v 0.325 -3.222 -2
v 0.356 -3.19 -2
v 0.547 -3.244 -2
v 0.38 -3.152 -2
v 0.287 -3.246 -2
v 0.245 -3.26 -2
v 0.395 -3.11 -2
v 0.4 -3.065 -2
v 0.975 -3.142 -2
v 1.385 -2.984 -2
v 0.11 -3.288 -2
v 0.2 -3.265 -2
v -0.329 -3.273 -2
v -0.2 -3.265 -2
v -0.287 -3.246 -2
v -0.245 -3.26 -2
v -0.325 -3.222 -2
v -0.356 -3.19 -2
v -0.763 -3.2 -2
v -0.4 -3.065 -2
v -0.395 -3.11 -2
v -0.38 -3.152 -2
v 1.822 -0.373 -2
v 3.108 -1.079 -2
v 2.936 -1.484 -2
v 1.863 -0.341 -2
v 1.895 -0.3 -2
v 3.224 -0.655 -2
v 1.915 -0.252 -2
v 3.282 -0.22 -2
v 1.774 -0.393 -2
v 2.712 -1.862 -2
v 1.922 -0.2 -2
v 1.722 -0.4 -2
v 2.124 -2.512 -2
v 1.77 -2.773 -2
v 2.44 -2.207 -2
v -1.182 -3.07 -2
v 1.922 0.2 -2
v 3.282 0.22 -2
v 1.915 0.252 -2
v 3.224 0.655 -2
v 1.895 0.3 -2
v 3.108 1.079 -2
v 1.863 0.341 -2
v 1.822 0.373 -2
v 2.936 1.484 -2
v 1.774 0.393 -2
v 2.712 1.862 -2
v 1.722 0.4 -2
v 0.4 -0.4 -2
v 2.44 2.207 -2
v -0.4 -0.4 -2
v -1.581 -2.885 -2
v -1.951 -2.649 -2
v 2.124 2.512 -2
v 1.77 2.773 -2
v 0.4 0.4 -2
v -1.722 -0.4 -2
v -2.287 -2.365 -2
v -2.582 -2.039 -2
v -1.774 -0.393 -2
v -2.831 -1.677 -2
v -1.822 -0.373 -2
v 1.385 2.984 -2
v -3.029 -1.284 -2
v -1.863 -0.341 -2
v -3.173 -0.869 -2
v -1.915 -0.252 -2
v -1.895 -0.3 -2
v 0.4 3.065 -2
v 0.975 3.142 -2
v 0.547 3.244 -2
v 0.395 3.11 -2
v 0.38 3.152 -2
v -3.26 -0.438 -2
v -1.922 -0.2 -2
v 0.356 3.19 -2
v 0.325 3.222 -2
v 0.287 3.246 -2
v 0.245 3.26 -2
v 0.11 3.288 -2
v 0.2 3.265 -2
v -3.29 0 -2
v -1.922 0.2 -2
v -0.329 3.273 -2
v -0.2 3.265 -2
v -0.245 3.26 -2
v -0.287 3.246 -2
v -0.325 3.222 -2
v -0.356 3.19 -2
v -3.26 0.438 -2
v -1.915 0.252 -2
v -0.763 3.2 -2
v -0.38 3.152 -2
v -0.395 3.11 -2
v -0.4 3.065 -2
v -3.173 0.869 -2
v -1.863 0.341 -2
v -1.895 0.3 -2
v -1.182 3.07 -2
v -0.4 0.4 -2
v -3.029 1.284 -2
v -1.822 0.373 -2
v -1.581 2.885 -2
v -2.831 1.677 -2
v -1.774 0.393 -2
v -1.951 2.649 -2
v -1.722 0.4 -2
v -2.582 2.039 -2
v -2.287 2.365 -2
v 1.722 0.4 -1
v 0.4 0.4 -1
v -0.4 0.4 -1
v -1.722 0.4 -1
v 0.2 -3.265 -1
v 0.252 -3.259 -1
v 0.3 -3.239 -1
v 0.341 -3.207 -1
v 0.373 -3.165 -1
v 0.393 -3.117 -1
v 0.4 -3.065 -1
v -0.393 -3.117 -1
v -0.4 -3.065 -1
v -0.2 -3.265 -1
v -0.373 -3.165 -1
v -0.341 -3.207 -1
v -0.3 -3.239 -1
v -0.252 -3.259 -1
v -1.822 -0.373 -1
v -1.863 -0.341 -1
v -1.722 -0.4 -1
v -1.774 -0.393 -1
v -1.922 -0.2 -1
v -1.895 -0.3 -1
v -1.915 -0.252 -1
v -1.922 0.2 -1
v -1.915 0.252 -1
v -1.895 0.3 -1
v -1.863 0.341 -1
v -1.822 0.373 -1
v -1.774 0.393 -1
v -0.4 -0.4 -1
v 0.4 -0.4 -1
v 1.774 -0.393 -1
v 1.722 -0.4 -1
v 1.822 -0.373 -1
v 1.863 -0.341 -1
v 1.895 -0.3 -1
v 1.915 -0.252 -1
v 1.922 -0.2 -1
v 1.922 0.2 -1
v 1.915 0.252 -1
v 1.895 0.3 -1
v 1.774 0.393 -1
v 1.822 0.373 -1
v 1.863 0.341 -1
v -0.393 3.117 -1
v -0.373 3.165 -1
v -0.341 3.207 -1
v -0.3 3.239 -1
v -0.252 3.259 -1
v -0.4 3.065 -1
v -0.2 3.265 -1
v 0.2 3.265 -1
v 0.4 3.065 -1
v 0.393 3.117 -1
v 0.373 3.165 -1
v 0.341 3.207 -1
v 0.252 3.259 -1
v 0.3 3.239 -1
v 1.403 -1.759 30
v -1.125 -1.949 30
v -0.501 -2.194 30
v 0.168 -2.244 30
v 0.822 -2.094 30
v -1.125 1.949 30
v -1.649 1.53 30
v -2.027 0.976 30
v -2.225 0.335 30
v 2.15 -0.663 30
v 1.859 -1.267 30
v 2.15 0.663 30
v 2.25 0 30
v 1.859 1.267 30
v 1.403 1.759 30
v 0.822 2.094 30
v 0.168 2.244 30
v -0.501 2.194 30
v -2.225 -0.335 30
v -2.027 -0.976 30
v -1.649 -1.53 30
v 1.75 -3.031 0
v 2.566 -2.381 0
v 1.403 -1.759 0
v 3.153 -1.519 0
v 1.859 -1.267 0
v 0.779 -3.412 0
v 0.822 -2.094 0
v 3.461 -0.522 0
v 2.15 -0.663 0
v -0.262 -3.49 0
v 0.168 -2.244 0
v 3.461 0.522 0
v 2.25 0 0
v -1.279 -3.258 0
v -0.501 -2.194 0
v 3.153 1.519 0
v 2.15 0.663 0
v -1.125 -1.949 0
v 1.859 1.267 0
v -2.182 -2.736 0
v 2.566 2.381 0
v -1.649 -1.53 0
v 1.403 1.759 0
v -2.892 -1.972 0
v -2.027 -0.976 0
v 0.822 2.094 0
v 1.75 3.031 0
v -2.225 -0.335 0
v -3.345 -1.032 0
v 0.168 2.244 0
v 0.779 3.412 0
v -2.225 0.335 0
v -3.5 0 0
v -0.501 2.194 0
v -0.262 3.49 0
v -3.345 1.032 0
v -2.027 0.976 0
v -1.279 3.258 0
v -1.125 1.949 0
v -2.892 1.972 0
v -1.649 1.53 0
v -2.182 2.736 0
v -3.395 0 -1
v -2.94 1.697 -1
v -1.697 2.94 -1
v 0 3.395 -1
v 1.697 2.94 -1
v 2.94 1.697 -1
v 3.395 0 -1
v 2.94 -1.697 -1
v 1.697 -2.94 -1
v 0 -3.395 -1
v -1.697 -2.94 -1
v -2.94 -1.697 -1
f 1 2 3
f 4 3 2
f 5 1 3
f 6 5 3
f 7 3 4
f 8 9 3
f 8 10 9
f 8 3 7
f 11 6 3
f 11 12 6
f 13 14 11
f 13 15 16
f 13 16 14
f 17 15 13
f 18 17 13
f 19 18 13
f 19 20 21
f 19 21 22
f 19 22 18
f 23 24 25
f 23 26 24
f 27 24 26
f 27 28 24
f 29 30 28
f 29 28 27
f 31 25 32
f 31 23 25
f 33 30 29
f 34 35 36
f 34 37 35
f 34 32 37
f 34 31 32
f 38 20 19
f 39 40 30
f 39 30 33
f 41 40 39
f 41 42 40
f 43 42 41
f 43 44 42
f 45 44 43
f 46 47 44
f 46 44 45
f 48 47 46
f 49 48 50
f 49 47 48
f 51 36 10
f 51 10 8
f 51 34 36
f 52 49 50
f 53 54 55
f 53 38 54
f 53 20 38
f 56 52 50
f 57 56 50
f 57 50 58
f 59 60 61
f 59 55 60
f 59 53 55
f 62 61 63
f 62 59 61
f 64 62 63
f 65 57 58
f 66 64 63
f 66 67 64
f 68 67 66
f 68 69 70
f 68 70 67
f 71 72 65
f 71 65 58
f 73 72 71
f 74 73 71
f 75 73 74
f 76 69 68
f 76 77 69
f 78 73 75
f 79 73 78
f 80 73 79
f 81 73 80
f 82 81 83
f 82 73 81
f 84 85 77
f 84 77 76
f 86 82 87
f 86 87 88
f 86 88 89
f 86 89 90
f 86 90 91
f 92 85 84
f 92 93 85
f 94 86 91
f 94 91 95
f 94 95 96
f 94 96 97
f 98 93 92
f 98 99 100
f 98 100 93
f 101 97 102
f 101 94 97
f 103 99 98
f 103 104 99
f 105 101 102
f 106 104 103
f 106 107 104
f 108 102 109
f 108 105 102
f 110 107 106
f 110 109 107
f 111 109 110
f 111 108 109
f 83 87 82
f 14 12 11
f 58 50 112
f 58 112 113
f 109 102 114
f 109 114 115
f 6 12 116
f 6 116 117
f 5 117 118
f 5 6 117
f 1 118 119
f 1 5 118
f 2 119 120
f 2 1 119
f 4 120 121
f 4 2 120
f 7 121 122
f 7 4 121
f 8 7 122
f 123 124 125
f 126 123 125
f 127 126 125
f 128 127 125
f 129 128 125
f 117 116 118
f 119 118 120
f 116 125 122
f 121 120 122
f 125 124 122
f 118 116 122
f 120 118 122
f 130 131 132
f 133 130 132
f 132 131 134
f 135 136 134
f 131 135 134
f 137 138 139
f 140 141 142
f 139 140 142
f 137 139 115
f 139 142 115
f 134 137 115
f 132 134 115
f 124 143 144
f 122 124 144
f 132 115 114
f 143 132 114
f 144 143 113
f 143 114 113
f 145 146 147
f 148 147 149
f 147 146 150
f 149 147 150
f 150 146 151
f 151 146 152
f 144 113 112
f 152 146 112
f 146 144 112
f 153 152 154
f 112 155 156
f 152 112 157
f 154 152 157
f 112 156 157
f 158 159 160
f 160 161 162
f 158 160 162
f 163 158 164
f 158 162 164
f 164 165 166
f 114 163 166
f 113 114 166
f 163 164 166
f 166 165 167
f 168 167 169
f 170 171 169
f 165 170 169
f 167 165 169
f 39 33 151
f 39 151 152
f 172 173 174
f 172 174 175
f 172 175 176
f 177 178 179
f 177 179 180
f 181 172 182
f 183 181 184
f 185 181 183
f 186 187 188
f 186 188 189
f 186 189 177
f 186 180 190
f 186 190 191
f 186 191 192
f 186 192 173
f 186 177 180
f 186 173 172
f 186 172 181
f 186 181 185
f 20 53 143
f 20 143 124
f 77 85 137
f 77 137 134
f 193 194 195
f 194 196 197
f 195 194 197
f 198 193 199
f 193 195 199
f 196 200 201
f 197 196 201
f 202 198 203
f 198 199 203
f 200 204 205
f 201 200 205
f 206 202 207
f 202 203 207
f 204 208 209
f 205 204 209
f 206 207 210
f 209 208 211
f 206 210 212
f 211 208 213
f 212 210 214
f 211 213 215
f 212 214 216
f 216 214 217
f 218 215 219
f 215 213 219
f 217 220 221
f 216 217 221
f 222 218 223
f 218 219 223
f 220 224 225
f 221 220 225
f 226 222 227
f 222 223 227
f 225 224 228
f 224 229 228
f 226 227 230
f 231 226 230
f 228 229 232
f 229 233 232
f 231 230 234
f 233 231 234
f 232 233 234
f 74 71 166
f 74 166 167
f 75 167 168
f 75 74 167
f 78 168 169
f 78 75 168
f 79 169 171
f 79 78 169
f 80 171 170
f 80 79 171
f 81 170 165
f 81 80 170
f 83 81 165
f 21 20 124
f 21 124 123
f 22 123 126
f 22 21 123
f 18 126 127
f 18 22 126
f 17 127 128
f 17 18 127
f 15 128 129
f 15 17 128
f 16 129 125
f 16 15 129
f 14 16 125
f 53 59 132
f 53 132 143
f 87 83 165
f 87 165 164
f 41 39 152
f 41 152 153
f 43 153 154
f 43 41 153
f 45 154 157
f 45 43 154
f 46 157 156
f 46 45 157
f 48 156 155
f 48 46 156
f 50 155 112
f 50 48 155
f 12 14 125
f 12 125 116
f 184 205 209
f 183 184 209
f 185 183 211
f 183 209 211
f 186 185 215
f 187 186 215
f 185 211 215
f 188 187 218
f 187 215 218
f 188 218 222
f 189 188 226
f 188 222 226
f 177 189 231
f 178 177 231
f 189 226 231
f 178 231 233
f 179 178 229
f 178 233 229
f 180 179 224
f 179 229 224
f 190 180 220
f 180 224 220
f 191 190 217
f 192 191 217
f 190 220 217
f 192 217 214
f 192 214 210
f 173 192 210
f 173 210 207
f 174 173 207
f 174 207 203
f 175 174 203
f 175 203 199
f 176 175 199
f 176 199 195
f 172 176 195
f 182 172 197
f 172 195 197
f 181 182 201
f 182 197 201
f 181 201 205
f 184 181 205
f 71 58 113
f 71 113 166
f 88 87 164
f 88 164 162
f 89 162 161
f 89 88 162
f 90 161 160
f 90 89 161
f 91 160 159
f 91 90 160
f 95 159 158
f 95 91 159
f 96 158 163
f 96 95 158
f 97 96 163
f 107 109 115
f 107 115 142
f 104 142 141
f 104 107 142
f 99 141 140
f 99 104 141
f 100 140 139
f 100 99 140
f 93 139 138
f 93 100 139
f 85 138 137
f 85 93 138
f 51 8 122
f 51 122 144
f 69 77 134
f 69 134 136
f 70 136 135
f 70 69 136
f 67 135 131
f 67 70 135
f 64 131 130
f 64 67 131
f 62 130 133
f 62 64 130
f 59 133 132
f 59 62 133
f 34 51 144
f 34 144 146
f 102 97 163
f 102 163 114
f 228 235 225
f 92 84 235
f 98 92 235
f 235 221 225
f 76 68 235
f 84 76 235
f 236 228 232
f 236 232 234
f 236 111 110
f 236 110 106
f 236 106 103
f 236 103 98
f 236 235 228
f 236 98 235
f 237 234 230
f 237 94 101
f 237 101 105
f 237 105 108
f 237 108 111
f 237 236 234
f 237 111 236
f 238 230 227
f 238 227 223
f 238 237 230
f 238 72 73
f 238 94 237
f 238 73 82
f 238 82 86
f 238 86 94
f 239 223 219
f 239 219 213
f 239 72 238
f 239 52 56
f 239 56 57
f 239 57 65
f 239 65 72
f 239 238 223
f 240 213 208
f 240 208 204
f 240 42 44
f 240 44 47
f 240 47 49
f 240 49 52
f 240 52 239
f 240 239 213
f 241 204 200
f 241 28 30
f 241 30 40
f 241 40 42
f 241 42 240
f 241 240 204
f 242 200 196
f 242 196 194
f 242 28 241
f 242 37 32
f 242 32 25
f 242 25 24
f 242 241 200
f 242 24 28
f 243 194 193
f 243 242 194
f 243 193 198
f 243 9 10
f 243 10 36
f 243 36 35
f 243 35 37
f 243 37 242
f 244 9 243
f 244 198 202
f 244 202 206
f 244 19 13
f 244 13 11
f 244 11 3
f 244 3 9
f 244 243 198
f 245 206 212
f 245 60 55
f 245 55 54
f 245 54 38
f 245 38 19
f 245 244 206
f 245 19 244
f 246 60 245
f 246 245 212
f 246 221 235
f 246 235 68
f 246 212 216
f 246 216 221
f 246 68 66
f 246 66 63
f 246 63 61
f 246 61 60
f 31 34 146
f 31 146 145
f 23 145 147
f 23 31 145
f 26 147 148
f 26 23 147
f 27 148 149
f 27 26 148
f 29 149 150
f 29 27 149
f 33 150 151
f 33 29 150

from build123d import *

# Parameters (mm, degrees)
SKETCH1_R           = 2.25
BOSS_EXTRUDE1_DEPTH = 30
SKETCH2_R           = 3.5
BOSS_EXTRUDE2_DEPTH = 2
BOSS_EXTRUDE2_TAPER = 6
CUT_EXTRUDE1_DEPTH  = 1


with BuildPart() as part:
    # Sketch1 → Boss-Extrude1 (new body)
    with BuildSketch(Plane.XY):
        Circle(SKETCH1_R)
    extrude(amount=BOSS_EXTRUDE1_DEPTH)

    # Sketch2 → Boss-Extrude2 (add)
    with BuildSketch(Plane(origin=(0, 0, 0), x_dir=(-1, 0, 0), z_dir=(0, 0, -1))):
        Circle(SKETCH2_R)
    extrude(amount=BOSS_EXTRUDE2_DEPTH, taper=BOSS_EXTRUDE2_TAPER)

    # Sketch3 → Cut-Extrude1 (cut)
    with BuildSketch(Plane(origin=(0, 0, -2), x_dir=(-1, 0, 0), z_dir=(0, 0, -1))):
        with BuildLine():
            Line((-0.4, 0.4), (-0.4, 3.065383332))
            ThreePointArc((-0.4, 3.065383332), (-0.341421356, 3.206804689), (-0.2, 3.265383332))
            Line((-0.2, 3.265383332), (0.2, 3.265383332))
            ThreePointArc((0.2, 3.265383332), (0.341421356, 3.206804689), (0.4, 3.065383332))
            Line((0.4, 3.065383332), (0.4, 0.4))
            Line((0.4, 0.4), (1.721973592, 0.4))
            ThreePointArc((1.721973592, 0.4), (1.863394949, 0.341421356), (1.921973592, 0.2))
            Line((1.921973592, 0.2), (1.921973592, -0.2))
            ThreePointArc((1.921973592, -0.2), (1.863394949, -0.341421356), (1.721973592, -0.4))
            Line((1.721973592, -0.4), (0.4, -0.4))
            Line((0.4, -0.4), (0.4, -3.065383332))
            ThreePointArc((0.4, -3.065383332), (0.341421356, -3.206804689), (0.2, -3.265383332))
            Line((0.2, -3.265383332), (-0.2, -3.265383332))
            ThreePointArc((-0.2, -3.265383332), (-0.341421356, -3.206804689), (-0.4, -3.065383332))
            Line((-0.4, -3.065383332), (-0.4, -0.4))
            Line((-0.4, -0.4), (-1.721973592, -0.4))
            ThreePointArc((-1.721973592, -0.4), (-1.863394949, -0.341421356), (-1.921973592, -0.2))
            Line((-1.921973592, -0.2), (-1.921973592, 0.2))
            ThreePointArc((-1.921973592, 0.2), (-1.863394949, 0.341421356), (-1.721973592, 0.4))
            Line((-1.721973592, 0.4), (-0.4, 0.4))
        make_face()
    extrude(amount=-CUT_EXTRUDE1_DEPTH, mode=Mode.SUBTRACT)


solid = part.part
